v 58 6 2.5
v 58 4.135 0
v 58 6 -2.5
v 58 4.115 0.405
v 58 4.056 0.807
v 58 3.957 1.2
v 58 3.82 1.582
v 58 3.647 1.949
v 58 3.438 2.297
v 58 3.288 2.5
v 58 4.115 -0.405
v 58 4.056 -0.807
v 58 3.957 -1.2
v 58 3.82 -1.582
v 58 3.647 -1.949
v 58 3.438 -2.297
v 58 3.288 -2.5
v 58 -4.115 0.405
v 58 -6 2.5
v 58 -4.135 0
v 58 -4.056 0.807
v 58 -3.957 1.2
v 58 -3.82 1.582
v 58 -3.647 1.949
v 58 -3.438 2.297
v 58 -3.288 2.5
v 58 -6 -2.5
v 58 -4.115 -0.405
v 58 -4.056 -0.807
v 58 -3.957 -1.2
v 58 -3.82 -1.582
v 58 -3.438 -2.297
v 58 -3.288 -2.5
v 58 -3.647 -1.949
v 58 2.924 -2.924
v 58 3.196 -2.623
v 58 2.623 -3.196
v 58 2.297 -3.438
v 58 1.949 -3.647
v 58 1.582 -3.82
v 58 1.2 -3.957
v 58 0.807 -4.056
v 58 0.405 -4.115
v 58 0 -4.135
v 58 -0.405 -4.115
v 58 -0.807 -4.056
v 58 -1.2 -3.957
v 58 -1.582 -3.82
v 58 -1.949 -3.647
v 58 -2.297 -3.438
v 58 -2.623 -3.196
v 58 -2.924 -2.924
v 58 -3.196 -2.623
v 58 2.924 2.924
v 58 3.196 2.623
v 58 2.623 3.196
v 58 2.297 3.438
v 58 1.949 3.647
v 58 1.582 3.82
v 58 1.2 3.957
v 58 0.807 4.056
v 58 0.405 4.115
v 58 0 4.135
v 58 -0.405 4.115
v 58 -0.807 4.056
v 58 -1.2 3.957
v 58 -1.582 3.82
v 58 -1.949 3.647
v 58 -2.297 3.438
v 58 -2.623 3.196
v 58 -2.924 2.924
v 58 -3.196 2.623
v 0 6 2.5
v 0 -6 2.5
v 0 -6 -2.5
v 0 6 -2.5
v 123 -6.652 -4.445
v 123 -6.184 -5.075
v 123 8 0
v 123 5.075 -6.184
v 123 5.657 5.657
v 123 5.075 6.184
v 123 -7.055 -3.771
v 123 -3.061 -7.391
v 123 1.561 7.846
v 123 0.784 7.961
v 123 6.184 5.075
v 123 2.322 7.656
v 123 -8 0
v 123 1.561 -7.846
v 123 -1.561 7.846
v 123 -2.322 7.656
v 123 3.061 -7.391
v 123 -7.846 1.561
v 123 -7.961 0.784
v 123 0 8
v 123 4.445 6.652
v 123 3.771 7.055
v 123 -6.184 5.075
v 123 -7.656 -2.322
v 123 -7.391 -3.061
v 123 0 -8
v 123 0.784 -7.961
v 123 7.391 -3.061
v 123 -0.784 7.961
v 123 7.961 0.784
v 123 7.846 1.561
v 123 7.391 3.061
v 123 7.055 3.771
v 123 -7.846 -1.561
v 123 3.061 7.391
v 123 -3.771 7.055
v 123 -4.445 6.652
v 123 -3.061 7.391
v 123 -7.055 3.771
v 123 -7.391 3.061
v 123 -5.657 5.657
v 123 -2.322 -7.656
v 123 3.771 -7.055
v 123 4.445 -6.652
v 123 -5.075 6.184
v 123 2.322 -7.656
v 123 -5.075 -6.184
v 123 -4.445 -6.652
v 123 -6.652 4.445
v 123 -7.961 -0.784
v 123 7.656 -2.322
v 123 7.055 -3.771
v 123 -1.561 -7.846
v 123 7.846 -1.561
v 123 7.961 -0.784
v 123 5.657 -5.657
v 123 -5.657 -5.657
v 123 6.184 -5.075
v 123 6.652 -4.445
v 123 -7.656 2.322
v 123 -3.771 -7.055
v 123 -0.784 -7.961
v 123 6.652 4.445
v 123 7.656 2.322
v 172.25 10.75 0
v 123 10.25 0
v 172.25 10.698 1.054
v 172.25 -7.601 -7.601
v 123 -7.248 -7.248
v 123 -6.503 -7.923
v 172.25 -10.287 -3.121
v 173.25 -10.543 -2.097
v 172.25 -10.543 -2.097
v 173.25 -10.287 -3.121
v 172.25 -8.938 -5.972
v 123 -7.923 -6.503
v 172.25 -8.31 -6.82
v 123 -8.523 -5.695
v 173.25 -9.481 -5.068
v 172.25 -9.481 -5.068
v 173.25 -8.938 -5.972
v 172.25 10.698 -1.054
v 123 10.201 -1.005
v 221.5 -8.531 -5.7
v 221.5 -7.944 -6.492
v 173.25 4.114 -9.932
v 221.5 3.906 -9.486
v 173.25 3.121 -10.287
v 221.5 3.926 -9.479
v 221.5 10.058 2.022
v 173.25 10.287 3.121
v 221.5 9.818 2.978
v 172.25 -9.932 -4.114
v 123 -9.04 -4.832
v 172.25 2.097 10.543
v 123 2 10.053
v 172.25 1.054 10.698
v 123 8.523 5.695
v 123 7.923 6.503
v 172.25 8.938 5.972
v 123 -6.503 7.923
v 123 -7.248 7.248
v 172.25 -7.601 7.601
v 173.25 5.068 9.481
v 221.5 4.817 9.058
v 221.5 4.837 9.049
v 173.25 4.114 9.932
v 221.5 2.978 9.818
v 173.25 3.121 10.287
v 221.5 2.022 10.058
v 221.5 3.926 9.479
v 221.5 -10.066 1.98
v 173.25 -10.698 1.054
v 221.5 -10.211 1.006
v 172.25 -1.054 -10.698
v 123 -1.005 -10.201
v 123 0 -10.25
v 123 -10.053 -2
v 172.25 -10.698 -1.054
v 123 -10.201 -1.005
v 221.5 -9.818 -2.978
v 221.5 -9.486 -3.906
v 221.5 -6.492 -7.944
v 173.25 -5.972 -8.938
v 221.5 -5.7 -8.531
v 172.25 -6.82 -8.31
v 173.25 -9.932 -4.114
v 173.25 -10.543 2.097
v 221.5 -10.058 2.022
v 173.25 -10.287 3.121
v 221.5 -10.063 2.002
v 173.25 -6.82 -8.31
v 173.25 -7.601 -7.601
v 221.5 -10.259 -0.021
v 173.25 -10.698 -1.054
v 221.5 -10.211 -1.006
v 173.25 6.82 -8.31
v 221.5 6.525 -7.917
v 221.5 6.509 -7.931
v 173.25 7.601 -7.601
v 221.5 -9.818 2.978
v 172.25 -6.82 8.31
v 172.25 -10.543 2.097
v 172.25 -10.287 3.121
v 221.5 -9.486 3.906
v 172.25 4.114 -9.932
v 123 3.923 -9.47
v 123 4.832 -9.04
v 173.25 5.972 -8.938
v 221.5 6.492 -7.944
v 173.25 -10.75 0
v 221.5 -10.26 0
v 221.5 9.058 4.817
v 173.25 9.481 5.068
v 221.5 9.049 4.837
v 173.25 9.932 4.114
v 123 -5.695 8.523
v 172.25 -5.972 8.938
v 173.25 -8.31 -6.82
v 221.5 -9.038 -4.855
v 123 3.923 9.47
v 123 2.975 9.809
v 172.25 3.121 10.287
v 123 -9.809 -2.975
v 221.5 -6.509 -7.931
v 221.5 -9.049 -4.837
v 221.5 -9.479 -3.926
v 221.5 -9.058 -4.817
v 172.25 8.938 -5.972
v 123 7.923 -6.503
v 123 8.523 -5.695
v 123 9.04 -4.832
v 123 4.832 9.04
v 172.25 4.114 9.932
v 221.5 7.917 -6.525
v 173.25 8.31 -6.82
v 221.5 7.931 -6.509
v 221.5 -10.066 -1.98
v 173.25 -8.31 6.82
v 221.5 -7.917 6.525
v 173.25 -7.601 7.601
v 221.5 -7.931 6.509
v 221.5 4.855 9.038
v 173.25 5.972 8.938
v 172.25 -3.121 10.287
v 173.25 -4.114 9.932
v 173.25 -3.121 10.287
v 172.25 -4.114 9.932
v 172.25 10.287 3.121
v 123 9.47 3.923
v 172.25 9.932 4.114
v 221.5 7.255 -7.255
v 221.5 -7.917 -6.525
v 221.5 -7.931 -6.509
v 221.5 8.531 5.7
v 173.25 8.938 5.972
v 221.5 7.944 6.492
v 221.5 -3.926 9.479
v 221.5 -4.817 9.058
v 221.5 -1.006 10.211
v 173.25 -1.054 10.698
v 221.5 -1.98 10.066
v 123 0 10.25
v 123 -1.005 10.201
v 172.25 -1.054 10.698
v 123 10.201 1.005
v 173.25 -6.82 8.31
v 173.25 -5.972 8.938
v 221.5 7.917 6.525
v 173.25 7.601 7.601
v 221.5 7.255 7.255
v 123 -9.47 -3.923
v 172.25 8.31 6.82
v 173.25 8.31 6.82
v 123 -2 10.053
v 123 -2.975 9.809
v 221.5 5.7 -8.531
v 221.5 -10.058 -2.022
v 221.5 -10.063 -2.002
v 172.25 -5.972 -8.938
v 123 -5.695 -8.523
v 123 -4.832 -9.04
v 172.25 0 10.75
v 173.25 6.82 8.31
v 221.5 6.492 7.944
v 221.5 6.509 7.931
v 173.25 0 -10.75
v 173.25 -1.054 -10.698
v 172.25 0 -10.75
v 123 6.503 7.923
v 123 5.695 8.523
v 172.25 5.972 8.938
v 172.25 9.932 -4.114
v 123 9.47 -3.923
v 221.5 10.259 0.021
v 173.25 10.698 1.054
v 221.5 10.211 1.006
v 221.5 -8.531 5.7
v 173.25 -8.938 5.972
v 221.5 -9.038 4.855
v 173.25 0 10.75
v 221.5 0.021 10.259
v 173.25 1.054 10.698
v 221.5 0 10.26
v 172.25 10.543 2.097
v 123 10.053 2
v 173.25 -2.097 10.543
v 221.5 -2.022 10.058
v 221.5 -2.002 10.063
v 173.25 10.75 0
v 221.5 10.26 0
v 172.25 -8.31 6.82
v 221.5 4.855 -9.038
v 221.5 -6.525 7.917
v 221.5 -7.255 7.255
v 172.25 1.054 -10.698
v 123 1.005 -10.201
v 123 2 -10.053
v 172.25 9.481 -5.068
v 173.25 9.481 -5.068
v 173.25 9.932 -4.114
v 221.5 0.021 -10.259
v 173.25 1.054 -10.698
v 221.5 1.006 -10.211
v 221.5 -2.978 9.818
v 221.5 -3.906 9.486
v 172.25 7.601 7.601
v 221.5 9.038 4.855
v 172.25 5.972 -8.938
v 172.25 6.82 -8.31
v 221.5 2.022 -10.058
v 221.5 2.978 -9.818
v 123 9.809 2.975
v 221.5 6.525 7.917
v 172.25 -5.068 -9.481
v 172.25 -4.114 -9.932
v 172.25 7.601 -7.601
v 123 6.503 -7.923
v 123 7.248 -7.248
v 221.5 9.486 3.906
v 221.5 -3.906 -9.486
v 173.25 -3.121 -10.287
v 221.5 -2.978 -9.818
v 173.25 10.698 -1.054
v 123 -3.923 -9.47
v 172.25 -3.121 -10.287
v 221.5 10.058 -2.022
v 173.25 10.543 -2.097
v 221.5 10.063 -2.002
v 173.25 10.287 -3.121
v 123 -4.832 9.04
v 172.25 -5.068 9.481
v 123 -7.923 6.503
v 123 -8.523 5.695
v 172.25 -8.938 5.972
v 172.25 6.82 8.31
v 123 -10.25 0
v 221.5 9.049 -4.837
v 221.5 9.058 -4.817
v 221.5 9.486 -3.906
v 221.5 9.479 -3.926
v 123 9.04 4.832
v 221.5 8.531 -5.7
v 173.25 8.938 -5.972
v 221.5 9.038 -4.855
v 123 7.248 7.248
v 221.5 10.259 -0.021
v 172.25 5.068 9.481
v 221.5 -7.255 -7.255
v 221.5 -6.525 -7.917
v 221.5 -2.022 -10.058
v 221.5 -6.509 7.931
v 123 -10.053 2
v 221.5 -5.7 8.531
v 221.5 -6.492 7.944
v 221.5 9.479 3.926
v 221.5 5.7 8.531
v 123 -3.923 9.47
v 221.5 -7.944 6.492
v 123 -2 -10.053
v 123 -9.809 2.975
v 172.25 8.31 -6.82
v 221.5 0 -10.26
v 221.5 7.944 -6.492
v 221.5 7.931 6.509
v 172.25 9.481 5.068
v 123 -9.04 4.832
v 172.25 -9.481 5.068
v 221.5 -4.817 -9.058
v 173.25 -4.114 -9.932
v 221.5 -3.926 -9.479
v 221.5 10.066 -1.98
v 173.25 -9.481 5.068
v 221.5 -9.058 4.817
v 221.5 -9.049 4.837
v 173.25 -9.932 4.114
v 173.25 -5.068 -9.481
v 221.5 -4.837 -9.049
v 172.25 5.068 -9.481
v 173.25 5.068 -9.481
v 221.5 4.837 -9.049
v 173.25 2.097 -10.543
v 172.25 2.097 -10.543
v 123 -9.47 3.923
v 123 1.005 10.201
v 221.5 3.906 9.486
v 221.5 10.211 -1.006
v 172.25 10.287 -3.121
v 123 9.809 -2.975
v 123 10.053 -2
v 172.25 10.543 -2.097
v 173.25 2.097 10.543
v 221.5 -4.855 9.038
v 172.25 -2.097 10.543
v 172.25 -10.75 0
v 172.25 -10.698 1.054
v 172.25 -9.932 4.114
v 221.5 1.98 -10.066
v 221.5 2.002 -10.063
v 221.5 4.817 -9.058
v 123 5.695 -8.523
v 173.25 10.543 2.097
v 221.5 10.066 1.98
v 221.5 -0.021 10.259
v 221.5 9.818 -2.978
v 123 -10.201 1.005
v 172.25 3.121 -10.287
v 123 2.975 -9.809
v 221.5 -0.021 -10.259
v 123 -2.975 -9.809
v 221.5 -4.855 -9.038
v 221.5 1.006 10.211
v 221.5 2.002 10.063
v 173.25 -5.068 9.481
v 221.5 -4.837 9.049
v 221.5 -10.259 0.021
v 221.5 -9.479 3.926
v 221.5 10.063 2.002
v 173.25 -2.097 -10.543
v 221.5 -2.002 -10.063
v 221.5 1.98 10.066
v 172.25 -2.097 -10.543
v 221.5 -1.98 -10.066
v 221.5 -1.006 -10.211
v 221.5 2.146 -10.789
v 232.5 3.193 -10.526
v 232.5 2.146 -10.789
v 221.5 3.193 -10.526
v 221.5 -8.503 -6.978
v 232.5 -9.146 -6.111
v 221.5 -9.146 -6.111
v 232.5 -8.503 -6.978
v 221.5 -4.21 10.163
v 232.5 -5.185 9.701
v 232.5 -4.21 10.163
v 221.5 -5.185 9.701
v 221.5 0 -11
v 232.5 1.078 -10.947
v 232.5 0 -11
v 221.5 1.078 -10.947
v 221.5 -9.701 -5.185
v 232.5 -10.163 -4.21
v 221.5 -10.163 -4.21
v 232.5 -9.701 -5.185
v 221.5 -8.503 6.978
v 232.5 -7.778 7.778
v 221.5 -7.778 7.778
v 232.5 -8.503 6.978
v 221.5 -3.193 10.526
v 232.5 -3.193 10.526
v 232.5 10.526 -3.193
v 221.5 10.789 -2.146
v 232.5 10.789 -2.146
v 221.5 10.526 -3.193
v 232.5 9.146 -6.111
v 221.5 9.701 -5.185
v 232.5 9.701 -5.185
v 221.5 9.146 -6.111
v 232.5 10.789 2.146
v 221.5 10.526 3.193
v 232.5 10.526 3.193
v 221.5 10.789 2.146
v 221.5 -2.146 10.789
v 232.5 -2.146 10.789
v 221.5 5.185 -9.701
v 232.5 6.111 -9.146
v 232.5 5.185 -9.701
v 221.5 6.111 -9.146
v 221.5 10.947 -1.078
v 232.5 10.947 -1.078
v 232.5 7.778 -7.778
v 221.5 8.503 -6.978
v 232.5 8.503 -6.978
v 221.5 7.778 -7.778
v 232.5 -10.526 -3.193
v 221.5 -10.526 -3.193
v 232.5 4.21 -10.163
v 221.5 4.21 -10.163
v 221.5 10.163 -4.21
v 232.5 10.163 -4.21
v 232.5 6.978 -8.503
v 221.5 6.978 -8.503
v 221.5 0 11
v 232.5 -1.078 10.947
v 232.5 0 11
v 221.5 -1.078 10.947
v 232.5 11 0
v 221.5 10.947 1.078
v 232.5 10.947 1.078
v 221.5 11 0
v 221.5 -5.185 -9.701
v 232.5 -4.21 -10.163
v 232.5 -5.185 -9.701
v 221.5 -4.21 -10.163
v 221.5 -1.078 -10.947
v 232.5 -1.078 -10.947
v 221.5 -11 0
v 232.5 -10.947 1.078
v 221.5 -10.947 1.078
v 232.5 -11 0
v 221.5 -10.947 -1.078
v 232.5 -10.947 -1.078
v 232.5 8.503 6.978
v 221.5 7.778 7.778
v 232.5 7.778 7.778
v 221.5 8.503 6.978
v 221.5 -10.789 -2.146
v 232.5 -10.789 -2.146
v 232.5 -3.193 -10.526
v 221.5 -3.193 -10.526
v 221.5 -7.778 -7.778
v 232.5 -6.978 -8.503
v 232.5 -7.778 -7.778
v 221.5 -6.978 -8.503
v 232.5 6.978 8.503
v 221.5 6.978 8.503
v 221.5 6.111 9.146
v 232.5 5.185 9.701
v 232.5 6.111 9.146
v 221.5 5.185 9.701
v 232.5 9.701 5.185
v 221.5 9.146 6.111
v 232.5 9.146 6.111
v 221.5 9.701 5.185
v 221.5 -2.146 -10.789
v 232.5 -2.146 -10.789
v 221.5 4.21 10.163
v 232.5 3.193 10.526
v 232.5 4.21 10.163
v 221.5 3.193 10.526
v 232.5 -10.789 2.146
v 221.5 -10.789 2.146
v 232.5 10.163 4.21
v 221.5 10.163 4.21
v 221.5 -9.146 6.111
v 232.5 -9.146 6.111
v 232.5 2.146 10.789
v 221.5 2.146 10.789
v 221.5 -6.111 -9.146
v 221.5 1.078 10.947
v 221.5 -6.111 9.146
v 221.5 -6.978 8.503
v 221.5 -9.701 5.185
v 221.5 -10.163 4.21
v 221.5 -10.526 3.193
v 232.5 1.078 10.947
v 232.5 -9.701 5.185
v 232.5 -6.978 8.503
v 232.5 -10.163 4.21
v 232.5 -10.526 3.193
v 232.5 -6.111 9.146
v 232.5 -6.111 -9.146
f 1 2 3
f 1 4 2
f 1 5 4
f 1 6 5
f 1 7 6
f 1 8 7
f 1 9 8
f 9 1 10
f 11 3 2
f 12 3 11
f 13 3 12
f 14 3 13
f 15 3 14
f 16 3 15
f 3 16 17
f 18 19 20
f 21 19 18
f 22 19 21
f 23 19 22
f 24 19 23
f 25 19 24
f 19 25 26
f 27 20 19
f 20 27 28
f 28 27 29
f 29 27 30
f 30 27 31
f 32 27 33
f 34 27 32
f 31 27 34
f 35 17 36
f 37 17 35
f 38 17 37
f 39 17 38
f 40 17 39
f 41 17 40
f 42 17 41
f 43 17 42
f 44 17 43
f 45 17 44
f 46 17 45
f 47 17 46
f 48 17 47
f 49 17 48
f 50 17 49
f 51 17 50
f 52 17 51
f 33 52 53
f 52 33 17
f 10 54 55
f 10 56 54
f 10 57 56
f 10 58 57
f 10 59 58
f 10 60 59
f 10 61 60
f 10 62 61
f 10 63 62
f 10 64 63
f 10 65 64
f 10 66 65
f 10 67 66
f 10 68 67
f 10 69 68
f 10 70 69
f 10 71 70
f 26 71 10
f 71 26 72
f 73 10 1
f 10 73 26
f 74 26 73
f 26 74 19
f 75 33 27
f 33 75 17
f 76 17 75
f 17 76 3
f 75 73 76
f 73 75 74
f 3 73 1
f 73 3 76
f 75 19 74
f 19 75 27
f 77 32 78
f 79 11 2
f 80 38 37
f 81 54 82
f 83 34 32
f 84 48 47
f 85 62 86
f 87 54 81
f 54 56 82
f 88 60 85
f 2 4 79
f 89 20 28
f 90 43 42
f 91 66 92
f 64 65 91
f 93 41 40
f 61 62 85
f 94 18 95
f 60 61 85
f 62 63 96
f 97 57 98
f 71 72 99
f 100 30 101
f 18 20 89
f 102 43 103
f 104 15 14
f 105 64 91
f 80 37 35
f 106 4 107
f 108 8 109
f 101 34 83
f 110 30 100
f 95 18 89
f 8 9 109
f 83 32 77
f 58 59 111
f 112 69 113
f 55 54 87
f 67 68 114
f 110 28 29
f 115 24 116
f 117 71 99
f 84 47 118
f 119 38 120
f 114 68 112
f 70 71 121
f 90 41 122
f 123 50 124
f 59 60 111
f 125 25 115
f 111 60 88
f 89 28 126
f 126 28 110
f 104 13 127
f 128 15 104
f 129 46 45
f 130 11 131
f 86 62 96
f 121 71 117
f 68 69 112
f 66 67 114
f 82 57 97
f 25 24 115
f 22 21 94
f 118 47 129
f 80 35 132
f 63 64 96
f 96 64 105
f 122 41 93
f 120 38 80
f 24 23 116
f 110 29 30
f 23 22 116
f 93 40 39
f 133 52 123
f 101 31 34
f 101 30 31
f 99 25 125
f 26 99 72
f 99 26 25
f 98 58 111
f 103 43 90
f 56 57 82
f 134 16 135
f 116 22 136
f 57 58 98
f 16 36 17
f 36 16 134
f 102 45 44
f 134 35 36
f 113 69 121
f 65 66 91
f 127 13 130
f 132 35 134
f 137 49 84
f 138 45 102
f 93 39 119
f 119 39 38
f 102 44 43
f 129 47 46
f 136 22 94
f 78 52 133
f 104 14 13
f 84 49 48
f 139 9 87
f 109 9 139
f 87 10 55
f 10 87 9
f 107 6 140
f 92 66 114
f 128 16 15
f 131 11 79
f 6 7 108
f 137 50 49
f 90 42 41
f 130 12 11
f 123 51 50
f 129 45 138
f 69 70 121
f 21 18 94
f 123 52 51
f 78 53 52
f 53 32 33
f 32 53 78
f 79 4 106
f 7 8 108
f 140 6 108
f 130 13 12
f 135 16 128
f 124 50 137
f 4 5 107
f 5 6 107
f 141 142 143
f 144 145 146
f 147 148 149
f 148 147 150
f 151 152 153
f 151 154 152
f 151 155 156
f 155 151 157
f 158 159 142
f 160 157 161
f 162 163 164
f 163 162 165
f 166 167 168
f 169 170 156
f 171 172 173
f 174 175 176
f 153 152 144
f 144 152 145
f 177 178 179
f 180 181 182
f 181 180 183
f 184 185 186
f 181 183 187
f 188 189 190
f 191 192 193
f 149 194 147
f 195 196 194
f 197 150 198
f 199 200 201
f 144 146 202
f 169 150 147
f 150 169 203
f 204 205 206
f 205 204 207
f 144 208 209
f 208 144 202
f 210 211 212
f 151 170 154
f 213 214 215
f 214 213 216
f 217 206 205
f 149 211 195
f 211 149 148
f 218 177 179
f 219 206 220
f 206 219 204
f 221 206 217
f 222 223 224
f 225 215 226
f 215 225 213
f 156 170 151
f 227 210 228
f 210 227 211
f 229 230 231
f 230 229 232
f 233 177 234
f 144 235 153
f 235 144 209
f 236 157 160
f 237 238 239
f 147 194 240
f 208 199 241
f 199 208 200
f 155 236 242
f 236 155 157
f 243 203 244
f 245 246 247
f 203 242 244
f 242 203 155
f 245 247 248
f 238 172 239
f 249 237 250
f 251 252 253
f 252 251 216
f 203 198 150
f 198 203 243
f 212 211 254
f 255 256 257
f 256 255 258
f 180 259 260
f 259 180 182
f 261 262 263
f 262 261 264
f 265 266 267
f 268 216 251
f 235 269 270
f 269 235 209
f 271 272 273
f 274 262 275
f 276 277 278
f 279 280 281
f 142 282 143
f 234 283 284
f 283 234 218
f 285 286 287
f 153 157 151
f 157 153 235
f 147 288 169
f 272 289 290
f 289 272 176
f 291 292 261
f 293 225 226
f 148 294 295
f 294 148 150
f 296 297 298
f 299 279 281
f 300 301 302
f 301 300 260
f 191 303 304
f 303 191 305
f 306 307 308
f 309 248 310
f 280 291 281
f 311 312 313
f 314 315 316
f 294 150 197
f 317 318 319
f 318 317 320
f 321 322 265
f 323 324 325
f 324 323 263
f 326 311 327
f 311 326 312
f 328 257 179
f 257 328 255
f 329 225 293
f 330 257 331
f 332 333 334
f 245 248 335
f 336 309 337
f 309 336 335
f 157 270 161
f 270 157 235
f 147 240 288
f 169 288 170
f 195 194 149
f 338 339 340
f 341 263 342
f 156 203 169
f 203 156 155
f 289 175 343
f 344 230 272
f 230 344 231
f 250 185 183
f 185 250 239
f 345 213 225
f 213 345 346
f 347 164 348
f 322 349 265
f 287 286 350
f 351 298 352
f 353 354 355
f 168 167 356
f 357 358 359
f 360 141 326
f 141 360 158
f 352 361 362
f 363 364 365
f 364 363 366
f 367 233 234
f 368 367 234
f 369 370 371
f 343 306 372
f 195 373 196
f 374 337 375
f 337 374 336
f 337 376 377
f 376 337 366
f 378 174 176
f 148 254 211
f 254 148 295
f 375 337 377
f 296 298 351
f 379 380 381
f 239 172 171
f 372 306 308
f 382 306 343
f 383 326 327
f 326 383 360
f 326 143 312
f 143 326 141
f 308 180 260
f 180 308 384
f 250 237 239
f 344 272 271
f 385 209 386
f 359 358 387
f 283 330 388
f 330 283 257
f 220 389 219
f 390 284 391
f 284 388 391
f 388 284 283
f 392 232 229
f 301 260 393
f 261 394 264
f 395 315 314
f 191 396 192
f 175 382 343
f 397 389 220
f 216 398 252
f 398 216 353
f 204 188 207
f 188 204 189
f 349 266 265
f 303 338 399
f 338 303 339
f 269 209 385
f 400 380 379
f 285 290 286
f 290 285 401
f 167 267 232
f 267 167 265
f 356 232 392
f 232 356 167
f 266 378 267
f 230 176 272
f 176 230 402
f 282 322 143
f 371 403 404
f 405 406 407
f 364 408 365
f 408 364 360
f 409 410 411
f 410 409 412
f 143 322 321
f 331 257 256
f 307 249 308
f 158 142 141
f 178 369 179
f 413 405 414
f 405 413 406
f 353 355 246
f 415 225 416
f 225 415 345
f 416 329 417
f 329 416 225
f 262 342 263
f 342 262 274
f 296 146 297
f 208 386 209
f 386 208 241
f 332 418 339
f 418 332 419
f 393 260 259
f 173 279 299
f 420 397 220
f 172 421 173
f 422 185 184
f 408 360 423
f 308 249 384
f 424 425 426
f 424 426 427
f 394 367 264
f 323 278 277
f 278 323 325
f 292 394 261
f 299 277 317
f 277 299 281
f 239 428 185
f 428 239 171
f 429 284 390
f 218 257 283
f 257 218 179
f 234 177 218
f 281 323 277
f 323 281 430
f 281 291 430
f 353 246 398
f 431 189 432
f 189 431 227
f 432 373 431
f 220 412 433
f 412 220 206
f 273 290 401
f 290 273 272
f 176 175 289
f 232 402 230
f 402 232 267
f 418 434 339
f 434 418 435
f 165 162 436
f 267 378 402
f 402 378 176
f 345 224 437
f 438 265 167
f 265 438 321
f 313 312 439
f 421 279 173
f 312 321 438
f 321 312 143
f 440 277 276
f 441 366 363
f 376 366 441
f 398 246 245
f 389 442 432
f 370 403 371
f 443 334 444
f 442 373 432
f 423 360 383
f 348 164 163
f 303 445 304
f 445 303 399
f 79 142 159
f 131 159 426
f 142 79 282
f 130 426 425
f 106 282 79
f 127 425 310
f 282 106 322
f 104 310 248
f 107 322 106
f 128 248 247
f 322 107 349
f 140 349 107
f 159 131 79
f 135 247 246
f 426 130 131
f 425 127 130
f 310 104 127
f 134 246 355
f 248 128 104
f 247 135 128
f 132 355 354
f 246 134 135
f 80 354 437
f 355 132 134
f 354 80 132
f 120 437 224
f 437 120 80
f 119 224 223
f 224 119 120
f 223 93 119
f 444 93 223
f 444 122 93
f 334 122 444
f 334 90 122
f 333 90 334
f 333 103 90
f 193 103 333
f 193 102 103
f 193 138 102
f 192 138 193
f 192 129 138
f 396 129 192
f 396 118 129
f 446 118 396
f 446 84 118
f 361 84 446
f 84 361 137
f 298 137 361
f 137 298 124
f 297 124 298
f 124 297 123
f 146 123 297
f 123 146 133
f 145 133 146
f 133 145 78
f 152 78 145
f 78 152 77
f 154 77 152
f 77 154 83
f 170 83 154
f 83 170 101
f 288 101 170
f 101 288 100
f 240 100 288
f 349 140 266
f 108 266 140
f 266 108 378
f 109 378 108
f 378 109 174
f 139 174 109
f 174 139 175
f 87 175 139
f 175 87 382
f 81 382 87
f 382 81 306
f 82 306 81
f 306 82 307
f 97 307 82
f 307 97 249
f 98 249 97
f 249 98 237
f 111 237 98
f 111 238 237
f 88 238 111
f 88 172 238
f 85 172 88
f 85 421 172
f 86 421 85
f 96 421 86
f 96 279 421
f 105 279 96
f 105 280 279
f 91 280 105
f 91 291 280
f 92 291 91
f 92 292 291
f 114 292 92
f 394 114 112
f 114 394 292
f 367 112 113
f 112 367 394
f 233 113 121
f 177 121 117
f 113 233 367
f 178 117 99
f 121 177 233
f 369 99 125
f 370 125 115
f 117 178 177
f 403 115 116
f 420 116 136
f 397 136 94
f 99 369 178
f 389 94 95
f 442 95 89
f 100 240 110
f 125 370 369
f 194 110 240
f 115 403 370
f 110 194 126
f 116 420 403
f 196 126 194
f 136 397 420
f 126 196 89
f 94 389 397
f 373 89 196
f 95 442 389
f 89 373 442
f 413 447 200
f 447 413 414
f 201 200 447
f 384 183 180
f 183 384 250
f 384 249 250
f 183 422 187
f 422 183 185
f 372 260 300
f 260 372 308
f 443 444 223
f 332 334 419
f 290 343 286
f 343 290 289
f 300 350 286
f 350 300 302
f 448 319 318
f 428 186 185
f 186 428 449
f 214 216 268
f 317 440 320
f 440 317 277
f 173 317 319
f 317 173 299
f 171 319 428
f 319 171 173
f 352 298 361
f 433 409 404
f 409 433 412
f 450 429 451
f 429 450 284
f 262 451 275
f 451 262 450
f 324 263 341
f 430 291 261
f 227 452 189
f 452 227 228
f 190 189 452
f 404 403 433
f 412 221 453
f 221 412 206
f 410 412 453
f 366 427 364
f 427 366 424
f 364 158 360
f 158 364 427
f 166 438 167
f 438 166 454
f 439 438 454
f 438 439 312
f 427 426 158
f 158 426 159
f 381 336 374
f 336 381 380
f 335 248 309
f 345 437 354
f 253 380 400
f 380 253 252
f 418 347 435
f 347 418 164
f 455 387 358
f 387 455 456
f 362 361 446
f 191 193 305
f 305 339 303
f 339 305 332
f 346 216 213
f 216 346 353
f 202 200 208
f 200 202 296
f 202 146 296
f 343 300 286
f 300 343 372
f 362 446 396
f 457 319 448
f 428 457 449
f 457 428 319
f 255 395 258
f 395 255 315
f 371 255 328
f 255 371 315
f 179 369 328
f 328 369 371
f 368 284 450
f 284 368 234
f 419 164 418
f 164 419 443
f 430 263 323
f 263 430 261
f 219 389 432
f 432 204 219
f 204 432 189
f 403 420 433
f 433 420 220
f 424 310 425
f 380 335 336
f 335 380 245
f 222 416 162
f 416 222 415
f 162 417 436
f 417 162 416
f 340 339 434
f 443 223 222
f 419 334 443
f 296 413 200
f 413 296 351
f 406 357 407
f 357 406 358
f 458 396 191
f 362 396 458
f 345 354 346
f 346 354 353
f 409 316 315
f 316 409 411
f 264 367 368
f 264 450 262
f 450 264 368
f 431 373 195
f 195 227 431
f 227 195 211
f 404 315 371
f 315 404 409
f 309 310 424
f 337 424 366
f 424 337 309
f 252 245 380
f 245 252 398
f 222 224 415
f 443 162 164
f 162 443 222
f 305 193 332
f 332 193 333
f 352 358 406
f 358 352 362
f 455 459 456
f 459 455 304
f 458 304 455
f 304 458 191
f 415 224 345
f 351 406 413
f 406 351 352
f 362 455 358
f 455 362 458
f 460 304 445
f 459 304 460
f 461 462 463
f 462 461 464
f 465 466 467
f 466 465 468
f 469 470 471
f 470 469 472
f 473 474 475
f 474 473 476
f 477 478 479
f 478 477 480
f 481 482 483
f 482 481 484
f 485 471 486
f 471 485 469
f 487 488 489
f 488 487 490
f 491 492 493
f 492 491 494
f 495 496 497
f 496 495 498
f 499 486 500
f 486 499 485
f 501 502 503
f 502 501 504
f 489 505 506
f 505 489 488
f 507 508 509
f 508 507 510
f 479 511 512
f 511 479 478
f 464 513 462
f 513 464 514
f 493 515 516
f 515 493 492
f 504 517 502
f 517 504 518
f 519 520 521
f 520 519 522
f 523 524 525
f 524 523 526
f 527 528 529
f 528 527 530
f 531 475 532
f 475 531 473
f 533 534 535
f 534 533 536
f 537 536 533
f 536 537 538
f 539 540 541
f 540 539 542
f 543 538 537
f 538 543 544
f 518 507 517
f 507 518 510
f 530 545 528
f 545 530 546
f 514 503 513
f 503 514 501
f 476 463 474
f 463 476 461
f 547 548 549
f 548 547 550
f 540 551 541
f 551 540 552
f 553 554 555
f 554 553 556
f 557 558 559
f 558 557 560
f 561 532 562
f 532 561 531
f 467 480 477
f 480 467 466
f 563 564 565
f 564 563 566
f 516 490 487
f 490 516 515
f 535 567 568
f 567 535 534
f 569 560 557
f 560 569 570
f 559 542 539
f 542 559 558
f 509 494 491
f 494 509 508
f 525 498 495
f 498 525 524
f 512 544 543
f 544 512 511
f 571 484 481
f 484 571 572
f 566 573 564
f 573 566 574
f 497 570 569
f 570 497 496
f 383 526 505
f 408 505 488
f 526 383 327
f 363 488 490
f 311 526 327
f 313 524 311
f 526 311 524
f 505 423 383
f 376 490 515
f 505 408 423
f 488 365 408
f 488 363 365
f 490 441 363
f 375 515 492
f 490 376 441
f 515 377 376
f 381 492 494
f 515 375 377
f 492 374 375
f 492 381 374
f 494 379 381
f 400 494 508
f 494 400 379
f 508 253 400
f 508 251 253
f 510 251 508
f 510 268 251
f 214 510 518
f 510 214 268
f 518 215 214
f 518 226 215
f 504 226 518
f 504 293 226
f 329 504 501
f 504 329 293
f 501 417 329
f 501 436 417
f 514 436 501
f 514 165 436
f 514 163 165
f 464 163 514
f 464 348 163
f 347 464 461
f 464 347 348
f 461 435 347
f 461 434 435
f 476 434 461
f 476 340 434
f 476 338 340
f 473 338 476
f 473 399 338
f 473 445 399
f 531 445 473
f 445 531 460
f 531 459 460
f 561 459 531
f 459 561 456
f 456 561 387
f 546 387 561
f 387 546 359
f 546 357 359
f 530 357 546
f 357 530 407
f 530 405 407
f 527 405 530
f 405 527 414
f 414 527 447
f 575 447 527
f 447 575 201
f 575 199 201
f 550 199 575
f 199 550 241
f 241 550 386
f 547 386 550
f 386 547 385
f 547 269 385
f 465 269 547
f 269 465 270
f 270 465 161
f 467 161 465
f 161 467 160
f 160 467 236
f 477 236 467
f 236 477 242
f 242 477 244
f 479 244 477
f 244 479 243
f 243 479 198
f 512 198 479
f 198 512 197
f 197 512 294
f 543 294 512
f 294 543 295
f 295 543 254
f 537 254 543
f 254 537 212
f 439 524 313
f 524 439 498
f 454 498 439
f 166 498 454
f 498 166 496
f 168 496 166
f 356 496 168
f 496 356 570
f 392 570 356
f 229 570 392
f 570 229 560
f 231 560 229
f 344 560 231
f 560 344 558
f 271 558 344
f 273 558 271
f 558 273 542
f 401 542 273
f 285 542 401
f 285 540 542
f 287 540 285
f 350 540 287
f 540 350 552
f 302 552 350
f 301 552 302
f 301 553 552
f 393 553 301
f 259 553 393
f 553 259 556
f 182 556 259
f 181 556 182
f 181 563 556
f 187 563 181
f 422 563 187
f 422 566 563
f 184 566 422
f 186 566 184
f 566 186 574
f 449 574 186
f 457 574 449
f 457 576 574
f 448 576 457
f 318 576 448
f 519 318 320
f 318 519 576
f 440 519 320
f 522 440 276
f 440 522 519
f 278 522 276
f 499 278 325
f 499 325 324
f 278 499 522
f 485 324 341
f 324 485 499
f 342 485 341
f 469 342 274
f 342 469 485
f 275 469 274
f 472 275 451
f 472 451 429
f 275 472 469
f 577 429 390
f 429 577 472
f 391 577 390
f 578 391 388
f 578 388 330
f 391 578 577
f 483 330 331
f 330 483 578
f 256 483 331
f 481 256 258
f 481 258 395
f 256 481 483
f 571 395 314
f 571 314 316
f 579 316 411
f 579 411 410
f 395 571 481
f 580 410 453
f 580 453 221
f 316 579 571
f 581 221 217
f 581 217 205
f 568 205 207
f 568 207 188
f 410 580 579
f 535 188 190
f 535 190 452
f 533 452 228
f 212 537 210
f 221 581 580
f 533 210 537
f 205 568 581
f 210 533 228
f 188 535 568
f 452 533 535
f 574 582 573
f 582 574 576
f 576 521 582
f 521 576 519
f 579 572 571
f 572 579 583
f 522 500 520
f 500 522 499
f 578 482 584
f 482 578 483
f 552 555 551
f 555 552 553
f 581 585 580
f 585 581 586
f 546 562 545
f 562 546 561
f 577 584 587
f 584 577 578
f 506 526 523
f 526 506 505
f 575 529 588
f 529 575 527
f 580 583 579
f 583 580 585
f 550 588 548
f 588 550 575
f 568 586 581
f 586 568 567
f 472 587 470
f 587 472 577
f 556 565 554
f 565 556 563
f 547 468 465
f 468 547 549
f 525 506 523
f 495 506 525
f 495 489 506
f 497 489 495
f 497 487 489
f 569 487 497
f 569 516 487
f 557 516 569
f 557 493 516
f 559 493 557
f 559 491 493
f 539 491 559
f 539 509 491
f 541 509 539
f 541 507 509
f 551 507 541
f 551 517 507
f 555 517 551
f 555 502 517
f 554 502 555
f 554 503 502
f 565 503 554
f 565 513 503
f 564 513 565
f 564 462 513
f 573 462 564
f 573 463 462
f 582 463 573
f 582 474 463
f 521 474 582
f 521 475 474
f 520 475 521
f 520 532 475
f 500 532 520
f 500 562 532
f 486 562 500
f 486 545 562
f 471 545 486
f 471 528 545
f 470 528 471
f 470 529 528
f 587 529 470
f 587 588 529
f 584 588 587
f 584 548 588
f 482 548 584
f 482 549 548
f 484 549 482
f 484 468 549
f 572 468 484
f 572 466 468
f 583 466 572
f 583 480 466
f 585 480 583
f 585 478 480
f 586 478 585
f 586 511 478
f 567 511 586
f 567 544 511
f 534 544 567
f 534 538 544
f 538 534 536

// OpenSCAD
// file: src/dovetail-chisel.scad
// src/dovetail-chisel.scad
// Dovetail Chisel Module
// All dimensions in millimeters (mm)

// ---- Parameters ----
// blade_width is passed in from the parent file
// Other dimensions are fixed per specification

blade_length = 58;
blade_thickness = 5;
socket_length = 65;
socket_blade_end_thickness = 8.27;
socket_handle_end_thickness = 16;
handle_length = 98.5; // includes ring
handle_ring_end_thickness = 20.5;
handle_mid_thickness = 21.5;
handle_socket_end_thickness = 20.5;
ring_length = 11;
ring_thickness = 22;

module dovetail_chisel(blade_width) {
    // Blade (lying down along X, centered to socket)
    translate([0, -blade_width/2, -blade_thickness/2])
        cube([blade_length, blade_width, blade_thickness], center=false);

    // Socket (lying down along X, center aligned to blade and handle)
    translate([
        blade_length,
        0,
        0
    ])
        hull() {
            rotate([0,90,0])
                cylinder(h=socket_length, r=socket_blade_end_thickness/2, $fn=64);
            translate([socket_length,0,0])
                rotate([0,90,0])
                    cylinder(h=1, r=socket_handle_end_thickness/2, $fn=64);
        }

    // Handle (lying down along X, center aligned to socket)
    translate([
        blade_length+socket_length,
        0,
        0
    ])
        hull() {
            rotate([0,90,0])
                cylinder(h=1, r=handle_socket_end_thickness/2, $fn=64);
            translate([handle_length/2,0,0])
                rotate([0,90,0])
                    cylinder(h=1, r=handle_mid_thickness/2, $fn=64);
            translate([handle_length,0,0])
                rotate([0,90,0])
                    cylinder(h=1, r=handle_ring_end_thickness/2, $fn=64);
        }

    // Ring (lying down along X, center aligned to handle)
    translate([
        blade_length+socket_length+handle_length,
        0,
        0
    ])
        rotate([0,90,0])
            cylinder(h=ring_length, r=ring_thickness/2, $fn=64);
}
// main file
// dovetail-chisel.scad
// Top-level file to select blade width and render dovetail chisel
// Usage: Set blade_width to 3, 6, or 12

// Select blade width here
blade_width = 12; // [3, 6, 12]

// Import the chisel module
use <src/dovetail-chisel.scad>;

dovetail_chisel(blade_width);
